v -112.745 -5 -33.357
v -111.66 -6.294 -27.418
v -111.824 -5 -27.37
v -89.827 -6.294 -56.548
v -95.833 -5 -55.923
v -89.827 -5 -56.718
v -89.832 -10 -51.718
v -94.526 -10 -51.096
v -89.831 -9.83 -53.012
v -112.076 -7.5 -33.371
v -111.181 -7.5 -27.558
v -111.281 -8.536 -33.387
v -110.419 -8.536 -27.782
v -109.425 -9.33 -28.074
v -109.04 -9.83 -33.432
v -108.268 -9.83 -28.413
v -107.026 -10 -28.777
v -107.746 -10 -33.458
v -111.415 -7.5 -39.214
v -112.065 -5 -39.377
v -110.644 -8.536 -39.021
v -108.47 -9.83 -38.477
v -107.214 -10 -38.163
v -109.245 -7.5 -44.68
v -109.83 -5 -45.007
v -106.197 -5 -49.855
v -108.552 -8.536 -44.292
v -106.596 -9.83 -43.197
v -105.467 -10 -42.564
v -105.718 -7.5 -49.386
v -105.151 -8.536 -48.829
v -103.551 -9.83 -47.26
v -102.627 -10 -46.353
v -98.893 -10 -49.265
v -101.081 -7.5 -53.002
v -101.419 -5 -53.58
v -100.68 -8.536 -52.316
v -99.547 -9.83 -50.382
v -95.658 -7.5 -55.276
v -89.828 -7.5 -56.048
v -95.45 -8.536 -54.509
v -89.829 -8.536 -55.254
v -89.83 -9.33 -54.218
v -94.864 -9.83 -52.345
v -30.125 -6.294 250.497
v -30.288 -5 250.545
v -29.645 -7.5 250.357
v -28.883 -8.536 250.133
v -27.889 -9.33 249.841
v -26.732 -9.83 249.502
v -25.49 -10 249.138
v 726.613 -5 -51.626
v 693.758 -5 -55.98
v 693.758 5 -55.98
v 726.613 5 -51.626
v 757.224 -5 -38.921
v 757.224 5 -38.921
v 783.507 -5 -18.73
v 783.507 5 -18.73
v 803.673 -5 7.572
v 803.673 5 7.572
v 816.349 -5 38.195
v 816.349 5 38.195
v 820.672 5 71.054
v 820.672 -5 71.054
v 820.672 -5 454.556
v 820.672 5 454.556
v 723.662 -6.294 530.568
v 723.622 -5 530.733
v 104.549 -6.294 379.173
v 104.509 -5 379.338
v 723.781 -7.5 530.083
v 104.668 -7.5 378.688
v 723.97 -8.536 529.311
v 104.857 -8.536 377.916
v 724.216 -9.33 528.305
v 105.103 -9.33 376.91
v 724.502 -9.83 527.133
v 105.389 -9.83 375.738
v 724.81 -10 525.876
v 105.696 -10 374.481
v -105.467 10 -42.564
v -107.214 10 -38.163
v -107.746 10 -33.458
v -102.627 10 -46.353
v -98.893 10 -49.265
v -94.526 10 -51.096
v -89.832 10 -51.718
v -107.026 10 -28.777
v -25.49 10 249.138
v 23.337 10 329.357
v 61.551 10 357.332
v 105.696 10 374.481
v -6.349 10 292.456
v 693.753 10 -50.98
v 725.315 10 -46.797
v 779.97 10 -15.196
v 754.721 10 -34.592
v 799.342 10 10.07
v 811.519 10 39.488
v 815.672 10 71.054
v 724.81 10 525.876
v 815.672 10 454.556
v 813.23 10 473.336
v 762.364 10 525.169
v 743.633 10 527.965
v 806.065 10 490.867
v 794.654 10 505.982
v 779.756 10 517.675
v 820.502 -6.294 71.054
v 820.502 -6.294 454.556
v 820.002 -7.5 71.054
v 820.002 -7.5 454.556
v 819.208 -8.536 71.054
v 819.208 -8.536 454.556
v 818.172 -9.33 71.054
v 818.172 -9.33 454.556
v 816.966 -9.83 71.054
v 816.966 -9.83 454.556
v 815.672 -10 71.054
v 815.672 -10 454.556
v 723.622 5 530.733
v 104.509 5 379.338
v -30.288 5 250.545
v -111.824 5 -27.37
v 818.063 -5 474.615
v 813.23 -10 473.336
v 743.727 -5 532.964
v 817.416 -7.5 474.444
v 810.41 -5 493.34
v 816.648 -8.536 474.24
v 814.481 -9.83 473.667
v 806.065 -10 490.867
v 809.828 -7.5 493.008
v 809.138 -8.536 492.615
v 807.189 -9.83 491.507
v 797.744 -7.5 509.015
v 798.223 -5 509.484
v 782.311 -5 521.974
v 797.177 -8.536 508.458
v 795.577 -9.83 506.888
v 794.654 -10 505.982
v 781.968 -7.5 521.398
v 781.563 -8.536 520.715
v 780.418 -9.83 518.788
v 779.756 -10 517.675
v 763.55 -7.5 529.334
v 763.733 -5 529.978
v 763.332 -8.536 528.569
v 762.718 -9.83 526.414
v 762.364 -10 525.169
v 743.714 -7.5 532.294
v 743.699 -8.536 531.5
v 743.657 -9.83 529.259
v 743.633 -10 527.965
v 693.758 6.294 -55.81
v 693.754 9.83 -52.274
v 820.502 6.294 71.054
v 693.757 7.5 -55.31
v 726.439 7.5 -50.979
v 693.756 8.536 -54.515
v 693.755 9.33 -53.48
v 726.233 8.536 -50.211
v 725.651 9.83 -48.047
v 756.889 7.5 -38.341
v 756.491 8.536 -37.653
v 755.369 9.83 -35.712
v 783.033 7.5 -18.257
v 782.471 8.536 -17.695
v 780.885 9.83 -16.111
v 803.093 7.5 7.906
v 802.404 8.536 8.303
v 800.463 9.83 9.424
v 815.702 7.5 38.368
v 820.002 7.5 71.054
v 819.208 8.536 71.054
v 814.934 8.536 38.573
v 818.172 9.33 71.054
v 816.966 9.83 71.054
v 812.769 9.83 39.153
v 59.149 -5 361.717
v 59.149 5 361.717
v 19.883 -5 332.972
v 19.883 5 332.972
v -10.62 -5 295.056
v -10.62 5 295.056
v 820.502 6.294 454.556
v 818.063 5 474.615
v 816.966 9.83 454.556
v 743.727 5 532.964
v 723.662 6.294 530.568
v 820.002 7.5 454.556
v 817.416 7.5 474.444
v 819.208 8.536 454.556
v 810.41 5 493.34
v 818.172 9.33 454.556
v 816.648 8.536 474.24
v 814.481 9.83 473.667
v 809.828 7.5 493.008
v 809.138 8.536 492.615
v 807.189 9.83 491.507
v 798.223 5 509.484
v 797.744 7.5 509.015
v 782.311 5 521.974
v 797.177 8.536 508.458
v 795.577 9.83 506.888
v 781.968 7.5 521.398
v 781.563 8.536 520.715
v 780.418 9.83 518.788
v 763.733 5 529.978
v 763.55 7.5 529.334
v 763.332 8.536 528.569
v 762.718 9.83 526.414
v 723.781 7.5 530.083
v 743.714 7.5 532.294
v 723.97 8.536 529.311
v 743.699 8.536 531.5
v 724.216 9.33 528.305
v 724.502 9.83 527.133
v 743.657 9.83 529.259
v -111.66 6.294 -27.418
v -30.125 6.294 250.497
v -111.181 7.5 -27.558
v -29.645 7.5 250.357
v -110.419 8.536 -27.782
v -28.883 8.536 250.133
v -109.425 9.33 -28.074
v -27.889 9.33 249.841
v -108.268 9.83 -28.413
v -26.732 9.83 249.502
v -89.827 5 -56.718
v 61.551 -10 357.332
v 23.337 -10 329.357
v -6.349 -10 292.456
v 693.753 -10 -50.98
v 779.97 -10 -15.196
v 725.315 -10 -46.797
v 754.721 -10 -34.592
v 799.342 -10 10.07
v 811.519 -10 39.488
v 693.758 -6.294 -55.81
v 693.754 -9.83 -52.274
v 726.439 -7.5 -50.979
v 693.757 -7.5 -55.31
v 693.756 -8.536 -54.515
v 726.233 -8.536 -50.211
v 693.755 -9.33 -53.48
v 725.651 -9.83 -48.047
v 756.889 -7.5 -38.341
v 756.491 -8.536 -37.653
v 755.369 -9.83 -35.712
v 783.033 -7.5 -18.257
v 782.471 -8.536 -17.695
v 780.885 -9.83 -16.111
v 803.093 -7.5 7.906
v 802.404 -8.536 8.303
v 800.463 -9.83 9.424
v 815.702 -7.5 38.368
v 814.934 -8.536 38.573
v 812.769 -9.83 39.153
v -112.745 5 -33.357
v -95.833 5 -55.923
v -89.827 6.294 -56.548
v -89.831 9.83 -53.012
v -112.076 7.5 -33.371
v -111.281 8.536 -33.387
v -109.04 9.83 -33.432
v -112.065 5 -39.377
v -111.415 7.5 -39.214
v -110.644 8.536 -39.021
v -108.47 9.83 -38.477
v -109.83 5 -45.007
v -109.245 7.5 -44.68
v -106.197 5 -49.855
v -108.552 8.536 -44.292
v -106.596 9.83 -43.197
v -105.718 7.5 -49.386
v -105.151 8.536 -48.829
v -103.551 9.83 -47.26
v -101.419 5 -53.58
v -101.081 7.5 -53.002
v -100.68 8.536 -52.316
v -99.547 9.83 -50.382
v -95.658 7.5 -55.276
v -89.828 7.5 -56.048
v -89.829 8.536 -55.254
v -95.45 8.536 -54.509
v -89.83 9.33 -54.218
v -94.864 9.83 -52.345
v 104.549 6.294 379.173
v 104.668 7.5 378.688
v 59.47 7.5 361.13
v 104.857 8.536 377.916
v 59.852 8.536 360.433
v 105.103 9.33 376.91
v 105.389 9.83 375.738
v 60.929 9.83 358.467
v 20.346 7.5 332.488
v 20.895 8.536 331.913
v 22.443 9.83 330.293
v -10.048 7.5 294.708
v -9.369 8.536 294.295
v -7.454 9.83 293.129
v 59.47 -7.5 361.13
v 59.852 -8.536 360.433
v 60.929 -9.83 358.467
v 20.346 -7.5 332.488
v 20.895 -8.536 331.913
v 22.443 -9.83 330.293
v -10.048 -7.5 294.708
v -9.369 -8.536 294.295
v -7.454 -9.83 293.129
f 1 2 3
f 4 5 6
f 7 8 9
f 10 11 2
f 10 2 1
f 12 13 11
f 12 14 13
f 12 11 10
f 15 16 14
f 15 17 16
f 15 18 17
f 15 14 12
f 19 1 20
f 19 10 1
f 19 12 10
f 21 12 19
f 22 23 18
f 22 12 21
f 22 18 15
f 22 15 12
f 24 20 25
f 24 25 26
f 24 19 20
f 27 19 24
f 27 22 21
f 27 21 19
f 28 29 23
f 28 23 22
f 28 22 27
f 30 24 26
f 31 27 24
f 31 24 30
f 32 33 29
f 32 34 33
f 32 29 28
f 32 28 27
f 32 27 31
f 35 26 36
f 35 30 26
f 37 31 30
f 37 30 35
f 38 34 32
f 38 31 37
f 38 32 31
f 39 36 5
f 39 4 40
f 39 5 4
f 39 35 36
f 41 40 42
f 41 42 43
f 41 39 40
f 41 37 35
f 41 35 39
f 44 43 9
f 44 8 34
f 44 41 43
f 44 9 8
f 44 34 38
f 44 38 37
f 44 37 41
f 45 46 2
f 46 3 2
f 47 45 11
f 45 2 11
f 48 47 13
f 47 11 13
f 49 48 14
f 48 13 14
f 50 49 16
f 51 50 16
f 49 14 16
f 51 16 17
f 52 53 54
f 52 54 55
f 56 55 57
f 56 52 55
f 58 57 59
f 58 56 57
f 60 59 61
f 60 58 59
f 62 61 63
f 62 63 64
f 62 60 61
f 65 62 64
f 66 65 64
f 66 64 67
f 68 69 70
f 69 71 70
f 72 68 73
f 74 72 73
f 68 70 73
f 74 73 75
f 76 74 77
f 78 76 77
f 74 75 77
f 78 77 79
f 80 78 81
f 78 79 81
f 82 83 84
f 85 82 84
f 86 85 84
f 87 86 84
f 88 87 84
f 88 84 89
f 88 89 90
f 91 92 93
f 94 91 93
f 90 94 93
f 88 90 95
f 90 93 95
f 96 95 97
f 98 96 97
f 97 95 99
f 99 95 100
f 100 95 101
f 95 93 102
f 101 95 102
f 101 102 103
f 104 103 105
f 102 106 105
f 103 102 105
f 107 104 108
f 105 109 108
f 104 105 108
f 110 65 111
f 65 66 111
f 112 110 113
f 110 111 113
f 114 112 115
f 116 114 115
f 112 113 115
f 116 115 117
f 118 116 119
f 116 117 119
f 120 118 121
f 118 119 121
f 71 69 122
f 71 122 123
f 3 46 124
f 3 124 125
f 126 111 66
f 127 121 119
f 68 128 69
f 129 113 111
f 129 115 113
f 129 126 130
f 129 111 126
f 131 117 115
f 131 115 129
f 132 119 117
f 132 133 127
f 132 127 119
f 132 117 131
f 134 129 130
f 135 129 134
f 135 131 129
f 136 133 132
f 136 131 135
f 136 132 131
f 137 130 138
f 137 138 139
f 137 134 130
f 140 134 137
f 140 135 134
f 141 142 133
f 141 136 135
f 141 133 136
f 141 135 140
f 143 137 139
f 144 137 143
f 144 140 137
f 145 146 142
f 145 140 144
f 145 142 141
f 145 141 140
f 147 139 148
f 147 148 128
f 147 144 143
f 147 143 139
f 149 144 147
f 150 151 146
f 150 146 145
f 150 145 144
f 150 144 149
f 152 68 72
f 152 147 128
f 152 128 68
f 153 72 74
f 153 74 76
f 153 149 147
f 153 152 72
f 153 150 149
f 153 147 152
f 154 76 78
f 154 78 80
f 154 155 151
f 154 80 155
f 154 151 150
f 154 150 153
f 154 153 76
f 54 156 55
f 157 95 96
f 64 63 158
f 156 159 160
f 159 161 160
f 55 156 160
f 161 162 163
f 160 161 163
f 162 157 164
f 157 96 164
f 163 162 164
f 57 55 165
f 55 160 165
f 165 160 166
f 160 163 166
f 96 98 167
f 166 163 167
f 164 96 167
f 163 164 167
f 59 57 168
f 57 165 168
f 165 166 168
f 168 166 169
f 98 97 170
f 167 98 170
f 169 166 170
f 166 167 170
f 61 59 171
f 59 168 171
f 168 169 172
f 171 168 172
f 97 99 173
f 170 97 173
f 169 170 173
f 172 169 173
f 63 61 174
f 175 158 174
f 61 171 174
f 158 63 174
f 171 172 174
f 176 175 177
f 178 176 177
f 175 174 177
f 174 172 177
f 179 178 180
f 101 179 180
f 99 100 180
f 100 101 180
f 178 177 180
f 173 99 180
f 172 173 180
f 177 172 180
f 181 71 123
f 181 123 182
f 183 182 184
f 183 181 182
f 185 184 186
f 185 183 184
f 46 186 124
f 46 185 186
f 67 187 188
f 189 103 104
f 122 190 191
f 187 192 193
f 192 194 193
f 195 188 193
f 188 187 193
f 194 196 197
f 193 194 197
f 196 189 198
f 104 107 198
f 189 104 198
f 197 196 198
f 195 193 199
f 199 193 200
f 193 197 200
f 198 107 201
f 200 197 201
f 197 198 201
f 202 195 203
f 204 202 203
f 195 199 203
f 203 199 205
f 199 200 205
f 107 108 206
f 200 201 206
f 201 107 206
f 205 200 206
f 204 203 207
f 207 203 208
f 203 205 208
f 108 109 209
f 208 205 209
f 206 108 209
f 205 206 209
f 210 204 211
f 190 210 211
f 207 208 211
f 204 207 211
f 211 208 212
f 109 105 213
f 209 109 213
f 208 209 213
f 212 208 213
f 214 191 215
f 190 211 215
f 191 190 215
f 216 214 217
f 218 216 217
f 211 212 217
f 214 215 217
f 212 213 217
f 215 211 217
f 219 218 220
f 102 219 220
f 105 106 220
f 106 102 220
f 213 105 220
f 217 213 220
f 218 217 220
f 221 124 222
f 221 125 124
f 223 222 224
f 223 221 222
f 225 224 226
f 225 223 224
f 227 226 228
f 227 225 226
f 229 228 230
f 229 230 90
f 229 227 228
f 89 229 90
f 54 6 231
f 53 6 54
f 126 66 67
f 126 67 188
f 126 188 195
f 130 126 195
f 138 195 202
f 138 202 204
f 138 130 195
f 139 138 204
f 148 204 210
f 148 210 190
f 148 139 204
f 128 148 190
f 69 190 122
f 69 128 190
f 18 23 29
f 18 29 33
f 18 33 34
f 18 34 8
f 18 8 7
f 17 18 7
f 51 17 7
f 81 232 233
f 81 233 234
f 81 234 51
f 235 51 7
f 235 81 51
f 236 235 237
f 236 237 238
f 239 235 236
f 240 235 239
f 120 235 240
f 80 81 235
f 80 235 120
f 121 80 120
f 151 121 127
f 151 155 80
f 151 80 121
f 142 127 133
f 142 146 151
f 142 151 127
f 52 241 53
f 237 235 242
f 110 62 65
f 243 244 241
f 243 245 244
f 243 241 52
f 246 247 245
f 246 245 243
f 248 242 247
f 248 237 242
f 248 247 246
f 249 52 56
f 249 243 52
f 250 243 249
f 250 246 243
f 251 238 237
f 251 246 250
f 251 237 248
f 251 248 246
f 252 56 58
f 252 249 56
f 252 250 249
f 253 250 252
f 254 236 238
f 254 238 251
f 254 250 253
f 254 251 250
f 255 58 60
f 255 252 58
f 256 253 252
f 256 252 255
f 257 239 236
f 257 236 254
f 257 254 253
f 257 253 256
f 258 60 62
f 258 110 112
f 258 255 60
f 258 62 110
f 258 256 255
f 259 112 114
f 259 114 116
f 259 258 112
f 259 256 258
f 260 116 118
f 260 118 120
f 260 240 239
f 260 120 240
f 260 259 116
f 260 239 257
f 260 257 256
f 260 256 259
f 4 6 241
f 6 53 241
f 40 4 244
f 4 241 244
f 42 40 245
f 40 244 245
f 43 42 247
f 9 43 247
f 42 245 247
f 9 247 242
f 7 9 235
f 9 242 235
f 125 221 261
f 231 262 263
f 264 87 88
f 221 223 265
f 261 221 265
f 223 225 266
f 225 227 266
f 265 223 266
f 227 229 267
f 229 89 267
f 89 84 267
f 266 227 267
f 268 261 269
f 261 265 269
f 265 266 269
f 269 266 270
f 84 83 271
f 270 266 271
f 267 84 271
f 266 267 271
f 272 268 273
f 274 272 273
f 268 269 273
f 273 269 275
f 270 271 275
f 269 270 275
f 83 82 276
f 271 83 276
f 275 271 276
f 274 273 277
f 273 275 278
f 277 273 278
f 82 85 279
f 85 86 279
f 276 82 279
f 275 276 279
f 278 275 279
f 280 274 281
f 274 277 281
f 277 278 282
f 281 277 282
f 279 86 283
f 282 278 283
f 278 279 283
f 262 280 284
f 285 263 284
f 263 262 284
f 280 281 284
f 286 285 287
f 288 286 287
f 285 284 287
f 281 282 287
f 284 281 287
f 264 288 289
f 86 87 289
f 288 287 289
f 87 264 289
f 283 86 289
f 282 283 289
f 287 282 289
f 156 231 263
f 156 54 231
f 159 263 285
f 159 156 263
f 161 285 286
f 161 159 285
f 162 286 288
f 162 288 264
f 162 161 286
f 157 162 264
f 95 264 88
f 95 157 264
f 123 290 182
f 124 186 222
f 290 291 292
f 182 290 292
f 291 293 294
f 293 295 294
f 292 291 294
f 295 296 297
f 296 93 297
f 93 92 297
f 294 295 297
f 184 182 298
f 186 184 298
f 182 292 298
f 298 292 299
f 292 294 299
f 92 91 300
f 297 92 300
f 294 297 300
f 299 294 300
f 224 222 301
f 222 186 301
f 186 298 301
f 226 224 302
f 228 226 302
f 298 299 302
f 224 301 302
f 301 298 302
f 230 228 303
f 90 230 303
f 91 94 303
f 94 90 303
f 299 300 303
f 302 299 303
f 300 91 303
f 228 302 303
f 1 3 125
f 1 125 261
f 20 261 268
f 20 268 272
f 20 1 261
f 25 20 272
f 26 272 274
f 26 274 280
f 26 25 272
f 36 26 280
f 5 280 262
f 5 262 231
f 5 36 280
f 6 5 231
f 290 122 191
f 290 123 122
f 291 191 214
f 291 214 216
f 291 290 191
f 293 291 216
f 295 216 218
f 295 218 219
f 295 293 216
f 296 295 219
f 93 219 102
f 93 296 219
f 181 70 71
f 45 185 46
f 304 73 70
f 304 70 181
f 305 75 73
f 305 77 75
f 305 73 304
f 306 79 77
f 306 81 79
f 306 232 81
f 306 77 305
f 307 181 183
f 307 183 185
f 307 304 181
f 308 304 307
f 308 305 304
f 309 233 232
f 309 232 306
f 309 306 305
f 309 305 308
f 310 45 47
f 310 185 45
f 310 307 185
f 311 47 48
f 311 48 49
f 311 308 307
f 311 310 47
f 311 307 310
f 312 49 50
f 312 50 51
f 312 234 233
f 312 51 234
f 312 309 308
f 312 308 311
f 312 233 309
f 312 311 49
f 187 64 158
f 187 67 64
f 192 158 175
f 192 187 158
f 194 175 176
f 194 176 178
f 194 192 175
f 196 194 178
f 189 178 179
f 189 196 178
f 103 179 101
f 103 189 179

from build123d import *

# Parameters (mm, degrees)
F1_DEPTH = 10
F2_R     = 5


with BuildPart() as f1:
    # F0 (on Front) → F1 (new body, symmetric)
    with BuildSketch(Plane.XZ):
        with BuildLine():
            Line((-30.288021, 250.545293), (-111.82384, -27.369829))
            ThreePointArc((-111.82384, -27.369829), (-108.174209, -47.551816), (-89.827259, -56.718156))
            Line((-89.827259, -56.718156), (693.757768, -55.979899))
            ThreePointArc((693.757768, -55.979899), (783.507042, -18.730212), (820.672154, 71.054117))
            Line((820.672154, 71.054117), (820.672154, 454.555666))
            ThreePointArc((820.672154, 454.555666), (790.670941, 516.243982), (723.621847, 530.733294))
            Line((723.621847, 530.733294), (104.508811, 379.338224))
            ThreePointArc((104.508811, 379.338224), (19.883125, 332.972107), (-30.288021, 250.545293))
        make_face()
    extrude(amount=F1_DEPTH, both=True)

    # F2
    f2_edges = [f1.edges().sort_by_distance(p)[0] for p in [
        (19.883125, -10, 332.972107),
        (414.065329, -10, 455.035759),
        (790.670941, -10, 516.243982),
        (820.672154, -10, 262.804891),
        (783.507042, -10, -18.730212),
        (301.965255, -10, -56.349027),
        (-108.174209, 10, -47.551816),
        (-71.055931, -10, 111.587732),
        (-71.055931, 10, 111.587732),
        (19.883125, 10, 332.972107),
        (301.965255, 10, -56.349027),
    ]]
    fillet(f2_edges, radius=F2_R)


solid = f1.part
